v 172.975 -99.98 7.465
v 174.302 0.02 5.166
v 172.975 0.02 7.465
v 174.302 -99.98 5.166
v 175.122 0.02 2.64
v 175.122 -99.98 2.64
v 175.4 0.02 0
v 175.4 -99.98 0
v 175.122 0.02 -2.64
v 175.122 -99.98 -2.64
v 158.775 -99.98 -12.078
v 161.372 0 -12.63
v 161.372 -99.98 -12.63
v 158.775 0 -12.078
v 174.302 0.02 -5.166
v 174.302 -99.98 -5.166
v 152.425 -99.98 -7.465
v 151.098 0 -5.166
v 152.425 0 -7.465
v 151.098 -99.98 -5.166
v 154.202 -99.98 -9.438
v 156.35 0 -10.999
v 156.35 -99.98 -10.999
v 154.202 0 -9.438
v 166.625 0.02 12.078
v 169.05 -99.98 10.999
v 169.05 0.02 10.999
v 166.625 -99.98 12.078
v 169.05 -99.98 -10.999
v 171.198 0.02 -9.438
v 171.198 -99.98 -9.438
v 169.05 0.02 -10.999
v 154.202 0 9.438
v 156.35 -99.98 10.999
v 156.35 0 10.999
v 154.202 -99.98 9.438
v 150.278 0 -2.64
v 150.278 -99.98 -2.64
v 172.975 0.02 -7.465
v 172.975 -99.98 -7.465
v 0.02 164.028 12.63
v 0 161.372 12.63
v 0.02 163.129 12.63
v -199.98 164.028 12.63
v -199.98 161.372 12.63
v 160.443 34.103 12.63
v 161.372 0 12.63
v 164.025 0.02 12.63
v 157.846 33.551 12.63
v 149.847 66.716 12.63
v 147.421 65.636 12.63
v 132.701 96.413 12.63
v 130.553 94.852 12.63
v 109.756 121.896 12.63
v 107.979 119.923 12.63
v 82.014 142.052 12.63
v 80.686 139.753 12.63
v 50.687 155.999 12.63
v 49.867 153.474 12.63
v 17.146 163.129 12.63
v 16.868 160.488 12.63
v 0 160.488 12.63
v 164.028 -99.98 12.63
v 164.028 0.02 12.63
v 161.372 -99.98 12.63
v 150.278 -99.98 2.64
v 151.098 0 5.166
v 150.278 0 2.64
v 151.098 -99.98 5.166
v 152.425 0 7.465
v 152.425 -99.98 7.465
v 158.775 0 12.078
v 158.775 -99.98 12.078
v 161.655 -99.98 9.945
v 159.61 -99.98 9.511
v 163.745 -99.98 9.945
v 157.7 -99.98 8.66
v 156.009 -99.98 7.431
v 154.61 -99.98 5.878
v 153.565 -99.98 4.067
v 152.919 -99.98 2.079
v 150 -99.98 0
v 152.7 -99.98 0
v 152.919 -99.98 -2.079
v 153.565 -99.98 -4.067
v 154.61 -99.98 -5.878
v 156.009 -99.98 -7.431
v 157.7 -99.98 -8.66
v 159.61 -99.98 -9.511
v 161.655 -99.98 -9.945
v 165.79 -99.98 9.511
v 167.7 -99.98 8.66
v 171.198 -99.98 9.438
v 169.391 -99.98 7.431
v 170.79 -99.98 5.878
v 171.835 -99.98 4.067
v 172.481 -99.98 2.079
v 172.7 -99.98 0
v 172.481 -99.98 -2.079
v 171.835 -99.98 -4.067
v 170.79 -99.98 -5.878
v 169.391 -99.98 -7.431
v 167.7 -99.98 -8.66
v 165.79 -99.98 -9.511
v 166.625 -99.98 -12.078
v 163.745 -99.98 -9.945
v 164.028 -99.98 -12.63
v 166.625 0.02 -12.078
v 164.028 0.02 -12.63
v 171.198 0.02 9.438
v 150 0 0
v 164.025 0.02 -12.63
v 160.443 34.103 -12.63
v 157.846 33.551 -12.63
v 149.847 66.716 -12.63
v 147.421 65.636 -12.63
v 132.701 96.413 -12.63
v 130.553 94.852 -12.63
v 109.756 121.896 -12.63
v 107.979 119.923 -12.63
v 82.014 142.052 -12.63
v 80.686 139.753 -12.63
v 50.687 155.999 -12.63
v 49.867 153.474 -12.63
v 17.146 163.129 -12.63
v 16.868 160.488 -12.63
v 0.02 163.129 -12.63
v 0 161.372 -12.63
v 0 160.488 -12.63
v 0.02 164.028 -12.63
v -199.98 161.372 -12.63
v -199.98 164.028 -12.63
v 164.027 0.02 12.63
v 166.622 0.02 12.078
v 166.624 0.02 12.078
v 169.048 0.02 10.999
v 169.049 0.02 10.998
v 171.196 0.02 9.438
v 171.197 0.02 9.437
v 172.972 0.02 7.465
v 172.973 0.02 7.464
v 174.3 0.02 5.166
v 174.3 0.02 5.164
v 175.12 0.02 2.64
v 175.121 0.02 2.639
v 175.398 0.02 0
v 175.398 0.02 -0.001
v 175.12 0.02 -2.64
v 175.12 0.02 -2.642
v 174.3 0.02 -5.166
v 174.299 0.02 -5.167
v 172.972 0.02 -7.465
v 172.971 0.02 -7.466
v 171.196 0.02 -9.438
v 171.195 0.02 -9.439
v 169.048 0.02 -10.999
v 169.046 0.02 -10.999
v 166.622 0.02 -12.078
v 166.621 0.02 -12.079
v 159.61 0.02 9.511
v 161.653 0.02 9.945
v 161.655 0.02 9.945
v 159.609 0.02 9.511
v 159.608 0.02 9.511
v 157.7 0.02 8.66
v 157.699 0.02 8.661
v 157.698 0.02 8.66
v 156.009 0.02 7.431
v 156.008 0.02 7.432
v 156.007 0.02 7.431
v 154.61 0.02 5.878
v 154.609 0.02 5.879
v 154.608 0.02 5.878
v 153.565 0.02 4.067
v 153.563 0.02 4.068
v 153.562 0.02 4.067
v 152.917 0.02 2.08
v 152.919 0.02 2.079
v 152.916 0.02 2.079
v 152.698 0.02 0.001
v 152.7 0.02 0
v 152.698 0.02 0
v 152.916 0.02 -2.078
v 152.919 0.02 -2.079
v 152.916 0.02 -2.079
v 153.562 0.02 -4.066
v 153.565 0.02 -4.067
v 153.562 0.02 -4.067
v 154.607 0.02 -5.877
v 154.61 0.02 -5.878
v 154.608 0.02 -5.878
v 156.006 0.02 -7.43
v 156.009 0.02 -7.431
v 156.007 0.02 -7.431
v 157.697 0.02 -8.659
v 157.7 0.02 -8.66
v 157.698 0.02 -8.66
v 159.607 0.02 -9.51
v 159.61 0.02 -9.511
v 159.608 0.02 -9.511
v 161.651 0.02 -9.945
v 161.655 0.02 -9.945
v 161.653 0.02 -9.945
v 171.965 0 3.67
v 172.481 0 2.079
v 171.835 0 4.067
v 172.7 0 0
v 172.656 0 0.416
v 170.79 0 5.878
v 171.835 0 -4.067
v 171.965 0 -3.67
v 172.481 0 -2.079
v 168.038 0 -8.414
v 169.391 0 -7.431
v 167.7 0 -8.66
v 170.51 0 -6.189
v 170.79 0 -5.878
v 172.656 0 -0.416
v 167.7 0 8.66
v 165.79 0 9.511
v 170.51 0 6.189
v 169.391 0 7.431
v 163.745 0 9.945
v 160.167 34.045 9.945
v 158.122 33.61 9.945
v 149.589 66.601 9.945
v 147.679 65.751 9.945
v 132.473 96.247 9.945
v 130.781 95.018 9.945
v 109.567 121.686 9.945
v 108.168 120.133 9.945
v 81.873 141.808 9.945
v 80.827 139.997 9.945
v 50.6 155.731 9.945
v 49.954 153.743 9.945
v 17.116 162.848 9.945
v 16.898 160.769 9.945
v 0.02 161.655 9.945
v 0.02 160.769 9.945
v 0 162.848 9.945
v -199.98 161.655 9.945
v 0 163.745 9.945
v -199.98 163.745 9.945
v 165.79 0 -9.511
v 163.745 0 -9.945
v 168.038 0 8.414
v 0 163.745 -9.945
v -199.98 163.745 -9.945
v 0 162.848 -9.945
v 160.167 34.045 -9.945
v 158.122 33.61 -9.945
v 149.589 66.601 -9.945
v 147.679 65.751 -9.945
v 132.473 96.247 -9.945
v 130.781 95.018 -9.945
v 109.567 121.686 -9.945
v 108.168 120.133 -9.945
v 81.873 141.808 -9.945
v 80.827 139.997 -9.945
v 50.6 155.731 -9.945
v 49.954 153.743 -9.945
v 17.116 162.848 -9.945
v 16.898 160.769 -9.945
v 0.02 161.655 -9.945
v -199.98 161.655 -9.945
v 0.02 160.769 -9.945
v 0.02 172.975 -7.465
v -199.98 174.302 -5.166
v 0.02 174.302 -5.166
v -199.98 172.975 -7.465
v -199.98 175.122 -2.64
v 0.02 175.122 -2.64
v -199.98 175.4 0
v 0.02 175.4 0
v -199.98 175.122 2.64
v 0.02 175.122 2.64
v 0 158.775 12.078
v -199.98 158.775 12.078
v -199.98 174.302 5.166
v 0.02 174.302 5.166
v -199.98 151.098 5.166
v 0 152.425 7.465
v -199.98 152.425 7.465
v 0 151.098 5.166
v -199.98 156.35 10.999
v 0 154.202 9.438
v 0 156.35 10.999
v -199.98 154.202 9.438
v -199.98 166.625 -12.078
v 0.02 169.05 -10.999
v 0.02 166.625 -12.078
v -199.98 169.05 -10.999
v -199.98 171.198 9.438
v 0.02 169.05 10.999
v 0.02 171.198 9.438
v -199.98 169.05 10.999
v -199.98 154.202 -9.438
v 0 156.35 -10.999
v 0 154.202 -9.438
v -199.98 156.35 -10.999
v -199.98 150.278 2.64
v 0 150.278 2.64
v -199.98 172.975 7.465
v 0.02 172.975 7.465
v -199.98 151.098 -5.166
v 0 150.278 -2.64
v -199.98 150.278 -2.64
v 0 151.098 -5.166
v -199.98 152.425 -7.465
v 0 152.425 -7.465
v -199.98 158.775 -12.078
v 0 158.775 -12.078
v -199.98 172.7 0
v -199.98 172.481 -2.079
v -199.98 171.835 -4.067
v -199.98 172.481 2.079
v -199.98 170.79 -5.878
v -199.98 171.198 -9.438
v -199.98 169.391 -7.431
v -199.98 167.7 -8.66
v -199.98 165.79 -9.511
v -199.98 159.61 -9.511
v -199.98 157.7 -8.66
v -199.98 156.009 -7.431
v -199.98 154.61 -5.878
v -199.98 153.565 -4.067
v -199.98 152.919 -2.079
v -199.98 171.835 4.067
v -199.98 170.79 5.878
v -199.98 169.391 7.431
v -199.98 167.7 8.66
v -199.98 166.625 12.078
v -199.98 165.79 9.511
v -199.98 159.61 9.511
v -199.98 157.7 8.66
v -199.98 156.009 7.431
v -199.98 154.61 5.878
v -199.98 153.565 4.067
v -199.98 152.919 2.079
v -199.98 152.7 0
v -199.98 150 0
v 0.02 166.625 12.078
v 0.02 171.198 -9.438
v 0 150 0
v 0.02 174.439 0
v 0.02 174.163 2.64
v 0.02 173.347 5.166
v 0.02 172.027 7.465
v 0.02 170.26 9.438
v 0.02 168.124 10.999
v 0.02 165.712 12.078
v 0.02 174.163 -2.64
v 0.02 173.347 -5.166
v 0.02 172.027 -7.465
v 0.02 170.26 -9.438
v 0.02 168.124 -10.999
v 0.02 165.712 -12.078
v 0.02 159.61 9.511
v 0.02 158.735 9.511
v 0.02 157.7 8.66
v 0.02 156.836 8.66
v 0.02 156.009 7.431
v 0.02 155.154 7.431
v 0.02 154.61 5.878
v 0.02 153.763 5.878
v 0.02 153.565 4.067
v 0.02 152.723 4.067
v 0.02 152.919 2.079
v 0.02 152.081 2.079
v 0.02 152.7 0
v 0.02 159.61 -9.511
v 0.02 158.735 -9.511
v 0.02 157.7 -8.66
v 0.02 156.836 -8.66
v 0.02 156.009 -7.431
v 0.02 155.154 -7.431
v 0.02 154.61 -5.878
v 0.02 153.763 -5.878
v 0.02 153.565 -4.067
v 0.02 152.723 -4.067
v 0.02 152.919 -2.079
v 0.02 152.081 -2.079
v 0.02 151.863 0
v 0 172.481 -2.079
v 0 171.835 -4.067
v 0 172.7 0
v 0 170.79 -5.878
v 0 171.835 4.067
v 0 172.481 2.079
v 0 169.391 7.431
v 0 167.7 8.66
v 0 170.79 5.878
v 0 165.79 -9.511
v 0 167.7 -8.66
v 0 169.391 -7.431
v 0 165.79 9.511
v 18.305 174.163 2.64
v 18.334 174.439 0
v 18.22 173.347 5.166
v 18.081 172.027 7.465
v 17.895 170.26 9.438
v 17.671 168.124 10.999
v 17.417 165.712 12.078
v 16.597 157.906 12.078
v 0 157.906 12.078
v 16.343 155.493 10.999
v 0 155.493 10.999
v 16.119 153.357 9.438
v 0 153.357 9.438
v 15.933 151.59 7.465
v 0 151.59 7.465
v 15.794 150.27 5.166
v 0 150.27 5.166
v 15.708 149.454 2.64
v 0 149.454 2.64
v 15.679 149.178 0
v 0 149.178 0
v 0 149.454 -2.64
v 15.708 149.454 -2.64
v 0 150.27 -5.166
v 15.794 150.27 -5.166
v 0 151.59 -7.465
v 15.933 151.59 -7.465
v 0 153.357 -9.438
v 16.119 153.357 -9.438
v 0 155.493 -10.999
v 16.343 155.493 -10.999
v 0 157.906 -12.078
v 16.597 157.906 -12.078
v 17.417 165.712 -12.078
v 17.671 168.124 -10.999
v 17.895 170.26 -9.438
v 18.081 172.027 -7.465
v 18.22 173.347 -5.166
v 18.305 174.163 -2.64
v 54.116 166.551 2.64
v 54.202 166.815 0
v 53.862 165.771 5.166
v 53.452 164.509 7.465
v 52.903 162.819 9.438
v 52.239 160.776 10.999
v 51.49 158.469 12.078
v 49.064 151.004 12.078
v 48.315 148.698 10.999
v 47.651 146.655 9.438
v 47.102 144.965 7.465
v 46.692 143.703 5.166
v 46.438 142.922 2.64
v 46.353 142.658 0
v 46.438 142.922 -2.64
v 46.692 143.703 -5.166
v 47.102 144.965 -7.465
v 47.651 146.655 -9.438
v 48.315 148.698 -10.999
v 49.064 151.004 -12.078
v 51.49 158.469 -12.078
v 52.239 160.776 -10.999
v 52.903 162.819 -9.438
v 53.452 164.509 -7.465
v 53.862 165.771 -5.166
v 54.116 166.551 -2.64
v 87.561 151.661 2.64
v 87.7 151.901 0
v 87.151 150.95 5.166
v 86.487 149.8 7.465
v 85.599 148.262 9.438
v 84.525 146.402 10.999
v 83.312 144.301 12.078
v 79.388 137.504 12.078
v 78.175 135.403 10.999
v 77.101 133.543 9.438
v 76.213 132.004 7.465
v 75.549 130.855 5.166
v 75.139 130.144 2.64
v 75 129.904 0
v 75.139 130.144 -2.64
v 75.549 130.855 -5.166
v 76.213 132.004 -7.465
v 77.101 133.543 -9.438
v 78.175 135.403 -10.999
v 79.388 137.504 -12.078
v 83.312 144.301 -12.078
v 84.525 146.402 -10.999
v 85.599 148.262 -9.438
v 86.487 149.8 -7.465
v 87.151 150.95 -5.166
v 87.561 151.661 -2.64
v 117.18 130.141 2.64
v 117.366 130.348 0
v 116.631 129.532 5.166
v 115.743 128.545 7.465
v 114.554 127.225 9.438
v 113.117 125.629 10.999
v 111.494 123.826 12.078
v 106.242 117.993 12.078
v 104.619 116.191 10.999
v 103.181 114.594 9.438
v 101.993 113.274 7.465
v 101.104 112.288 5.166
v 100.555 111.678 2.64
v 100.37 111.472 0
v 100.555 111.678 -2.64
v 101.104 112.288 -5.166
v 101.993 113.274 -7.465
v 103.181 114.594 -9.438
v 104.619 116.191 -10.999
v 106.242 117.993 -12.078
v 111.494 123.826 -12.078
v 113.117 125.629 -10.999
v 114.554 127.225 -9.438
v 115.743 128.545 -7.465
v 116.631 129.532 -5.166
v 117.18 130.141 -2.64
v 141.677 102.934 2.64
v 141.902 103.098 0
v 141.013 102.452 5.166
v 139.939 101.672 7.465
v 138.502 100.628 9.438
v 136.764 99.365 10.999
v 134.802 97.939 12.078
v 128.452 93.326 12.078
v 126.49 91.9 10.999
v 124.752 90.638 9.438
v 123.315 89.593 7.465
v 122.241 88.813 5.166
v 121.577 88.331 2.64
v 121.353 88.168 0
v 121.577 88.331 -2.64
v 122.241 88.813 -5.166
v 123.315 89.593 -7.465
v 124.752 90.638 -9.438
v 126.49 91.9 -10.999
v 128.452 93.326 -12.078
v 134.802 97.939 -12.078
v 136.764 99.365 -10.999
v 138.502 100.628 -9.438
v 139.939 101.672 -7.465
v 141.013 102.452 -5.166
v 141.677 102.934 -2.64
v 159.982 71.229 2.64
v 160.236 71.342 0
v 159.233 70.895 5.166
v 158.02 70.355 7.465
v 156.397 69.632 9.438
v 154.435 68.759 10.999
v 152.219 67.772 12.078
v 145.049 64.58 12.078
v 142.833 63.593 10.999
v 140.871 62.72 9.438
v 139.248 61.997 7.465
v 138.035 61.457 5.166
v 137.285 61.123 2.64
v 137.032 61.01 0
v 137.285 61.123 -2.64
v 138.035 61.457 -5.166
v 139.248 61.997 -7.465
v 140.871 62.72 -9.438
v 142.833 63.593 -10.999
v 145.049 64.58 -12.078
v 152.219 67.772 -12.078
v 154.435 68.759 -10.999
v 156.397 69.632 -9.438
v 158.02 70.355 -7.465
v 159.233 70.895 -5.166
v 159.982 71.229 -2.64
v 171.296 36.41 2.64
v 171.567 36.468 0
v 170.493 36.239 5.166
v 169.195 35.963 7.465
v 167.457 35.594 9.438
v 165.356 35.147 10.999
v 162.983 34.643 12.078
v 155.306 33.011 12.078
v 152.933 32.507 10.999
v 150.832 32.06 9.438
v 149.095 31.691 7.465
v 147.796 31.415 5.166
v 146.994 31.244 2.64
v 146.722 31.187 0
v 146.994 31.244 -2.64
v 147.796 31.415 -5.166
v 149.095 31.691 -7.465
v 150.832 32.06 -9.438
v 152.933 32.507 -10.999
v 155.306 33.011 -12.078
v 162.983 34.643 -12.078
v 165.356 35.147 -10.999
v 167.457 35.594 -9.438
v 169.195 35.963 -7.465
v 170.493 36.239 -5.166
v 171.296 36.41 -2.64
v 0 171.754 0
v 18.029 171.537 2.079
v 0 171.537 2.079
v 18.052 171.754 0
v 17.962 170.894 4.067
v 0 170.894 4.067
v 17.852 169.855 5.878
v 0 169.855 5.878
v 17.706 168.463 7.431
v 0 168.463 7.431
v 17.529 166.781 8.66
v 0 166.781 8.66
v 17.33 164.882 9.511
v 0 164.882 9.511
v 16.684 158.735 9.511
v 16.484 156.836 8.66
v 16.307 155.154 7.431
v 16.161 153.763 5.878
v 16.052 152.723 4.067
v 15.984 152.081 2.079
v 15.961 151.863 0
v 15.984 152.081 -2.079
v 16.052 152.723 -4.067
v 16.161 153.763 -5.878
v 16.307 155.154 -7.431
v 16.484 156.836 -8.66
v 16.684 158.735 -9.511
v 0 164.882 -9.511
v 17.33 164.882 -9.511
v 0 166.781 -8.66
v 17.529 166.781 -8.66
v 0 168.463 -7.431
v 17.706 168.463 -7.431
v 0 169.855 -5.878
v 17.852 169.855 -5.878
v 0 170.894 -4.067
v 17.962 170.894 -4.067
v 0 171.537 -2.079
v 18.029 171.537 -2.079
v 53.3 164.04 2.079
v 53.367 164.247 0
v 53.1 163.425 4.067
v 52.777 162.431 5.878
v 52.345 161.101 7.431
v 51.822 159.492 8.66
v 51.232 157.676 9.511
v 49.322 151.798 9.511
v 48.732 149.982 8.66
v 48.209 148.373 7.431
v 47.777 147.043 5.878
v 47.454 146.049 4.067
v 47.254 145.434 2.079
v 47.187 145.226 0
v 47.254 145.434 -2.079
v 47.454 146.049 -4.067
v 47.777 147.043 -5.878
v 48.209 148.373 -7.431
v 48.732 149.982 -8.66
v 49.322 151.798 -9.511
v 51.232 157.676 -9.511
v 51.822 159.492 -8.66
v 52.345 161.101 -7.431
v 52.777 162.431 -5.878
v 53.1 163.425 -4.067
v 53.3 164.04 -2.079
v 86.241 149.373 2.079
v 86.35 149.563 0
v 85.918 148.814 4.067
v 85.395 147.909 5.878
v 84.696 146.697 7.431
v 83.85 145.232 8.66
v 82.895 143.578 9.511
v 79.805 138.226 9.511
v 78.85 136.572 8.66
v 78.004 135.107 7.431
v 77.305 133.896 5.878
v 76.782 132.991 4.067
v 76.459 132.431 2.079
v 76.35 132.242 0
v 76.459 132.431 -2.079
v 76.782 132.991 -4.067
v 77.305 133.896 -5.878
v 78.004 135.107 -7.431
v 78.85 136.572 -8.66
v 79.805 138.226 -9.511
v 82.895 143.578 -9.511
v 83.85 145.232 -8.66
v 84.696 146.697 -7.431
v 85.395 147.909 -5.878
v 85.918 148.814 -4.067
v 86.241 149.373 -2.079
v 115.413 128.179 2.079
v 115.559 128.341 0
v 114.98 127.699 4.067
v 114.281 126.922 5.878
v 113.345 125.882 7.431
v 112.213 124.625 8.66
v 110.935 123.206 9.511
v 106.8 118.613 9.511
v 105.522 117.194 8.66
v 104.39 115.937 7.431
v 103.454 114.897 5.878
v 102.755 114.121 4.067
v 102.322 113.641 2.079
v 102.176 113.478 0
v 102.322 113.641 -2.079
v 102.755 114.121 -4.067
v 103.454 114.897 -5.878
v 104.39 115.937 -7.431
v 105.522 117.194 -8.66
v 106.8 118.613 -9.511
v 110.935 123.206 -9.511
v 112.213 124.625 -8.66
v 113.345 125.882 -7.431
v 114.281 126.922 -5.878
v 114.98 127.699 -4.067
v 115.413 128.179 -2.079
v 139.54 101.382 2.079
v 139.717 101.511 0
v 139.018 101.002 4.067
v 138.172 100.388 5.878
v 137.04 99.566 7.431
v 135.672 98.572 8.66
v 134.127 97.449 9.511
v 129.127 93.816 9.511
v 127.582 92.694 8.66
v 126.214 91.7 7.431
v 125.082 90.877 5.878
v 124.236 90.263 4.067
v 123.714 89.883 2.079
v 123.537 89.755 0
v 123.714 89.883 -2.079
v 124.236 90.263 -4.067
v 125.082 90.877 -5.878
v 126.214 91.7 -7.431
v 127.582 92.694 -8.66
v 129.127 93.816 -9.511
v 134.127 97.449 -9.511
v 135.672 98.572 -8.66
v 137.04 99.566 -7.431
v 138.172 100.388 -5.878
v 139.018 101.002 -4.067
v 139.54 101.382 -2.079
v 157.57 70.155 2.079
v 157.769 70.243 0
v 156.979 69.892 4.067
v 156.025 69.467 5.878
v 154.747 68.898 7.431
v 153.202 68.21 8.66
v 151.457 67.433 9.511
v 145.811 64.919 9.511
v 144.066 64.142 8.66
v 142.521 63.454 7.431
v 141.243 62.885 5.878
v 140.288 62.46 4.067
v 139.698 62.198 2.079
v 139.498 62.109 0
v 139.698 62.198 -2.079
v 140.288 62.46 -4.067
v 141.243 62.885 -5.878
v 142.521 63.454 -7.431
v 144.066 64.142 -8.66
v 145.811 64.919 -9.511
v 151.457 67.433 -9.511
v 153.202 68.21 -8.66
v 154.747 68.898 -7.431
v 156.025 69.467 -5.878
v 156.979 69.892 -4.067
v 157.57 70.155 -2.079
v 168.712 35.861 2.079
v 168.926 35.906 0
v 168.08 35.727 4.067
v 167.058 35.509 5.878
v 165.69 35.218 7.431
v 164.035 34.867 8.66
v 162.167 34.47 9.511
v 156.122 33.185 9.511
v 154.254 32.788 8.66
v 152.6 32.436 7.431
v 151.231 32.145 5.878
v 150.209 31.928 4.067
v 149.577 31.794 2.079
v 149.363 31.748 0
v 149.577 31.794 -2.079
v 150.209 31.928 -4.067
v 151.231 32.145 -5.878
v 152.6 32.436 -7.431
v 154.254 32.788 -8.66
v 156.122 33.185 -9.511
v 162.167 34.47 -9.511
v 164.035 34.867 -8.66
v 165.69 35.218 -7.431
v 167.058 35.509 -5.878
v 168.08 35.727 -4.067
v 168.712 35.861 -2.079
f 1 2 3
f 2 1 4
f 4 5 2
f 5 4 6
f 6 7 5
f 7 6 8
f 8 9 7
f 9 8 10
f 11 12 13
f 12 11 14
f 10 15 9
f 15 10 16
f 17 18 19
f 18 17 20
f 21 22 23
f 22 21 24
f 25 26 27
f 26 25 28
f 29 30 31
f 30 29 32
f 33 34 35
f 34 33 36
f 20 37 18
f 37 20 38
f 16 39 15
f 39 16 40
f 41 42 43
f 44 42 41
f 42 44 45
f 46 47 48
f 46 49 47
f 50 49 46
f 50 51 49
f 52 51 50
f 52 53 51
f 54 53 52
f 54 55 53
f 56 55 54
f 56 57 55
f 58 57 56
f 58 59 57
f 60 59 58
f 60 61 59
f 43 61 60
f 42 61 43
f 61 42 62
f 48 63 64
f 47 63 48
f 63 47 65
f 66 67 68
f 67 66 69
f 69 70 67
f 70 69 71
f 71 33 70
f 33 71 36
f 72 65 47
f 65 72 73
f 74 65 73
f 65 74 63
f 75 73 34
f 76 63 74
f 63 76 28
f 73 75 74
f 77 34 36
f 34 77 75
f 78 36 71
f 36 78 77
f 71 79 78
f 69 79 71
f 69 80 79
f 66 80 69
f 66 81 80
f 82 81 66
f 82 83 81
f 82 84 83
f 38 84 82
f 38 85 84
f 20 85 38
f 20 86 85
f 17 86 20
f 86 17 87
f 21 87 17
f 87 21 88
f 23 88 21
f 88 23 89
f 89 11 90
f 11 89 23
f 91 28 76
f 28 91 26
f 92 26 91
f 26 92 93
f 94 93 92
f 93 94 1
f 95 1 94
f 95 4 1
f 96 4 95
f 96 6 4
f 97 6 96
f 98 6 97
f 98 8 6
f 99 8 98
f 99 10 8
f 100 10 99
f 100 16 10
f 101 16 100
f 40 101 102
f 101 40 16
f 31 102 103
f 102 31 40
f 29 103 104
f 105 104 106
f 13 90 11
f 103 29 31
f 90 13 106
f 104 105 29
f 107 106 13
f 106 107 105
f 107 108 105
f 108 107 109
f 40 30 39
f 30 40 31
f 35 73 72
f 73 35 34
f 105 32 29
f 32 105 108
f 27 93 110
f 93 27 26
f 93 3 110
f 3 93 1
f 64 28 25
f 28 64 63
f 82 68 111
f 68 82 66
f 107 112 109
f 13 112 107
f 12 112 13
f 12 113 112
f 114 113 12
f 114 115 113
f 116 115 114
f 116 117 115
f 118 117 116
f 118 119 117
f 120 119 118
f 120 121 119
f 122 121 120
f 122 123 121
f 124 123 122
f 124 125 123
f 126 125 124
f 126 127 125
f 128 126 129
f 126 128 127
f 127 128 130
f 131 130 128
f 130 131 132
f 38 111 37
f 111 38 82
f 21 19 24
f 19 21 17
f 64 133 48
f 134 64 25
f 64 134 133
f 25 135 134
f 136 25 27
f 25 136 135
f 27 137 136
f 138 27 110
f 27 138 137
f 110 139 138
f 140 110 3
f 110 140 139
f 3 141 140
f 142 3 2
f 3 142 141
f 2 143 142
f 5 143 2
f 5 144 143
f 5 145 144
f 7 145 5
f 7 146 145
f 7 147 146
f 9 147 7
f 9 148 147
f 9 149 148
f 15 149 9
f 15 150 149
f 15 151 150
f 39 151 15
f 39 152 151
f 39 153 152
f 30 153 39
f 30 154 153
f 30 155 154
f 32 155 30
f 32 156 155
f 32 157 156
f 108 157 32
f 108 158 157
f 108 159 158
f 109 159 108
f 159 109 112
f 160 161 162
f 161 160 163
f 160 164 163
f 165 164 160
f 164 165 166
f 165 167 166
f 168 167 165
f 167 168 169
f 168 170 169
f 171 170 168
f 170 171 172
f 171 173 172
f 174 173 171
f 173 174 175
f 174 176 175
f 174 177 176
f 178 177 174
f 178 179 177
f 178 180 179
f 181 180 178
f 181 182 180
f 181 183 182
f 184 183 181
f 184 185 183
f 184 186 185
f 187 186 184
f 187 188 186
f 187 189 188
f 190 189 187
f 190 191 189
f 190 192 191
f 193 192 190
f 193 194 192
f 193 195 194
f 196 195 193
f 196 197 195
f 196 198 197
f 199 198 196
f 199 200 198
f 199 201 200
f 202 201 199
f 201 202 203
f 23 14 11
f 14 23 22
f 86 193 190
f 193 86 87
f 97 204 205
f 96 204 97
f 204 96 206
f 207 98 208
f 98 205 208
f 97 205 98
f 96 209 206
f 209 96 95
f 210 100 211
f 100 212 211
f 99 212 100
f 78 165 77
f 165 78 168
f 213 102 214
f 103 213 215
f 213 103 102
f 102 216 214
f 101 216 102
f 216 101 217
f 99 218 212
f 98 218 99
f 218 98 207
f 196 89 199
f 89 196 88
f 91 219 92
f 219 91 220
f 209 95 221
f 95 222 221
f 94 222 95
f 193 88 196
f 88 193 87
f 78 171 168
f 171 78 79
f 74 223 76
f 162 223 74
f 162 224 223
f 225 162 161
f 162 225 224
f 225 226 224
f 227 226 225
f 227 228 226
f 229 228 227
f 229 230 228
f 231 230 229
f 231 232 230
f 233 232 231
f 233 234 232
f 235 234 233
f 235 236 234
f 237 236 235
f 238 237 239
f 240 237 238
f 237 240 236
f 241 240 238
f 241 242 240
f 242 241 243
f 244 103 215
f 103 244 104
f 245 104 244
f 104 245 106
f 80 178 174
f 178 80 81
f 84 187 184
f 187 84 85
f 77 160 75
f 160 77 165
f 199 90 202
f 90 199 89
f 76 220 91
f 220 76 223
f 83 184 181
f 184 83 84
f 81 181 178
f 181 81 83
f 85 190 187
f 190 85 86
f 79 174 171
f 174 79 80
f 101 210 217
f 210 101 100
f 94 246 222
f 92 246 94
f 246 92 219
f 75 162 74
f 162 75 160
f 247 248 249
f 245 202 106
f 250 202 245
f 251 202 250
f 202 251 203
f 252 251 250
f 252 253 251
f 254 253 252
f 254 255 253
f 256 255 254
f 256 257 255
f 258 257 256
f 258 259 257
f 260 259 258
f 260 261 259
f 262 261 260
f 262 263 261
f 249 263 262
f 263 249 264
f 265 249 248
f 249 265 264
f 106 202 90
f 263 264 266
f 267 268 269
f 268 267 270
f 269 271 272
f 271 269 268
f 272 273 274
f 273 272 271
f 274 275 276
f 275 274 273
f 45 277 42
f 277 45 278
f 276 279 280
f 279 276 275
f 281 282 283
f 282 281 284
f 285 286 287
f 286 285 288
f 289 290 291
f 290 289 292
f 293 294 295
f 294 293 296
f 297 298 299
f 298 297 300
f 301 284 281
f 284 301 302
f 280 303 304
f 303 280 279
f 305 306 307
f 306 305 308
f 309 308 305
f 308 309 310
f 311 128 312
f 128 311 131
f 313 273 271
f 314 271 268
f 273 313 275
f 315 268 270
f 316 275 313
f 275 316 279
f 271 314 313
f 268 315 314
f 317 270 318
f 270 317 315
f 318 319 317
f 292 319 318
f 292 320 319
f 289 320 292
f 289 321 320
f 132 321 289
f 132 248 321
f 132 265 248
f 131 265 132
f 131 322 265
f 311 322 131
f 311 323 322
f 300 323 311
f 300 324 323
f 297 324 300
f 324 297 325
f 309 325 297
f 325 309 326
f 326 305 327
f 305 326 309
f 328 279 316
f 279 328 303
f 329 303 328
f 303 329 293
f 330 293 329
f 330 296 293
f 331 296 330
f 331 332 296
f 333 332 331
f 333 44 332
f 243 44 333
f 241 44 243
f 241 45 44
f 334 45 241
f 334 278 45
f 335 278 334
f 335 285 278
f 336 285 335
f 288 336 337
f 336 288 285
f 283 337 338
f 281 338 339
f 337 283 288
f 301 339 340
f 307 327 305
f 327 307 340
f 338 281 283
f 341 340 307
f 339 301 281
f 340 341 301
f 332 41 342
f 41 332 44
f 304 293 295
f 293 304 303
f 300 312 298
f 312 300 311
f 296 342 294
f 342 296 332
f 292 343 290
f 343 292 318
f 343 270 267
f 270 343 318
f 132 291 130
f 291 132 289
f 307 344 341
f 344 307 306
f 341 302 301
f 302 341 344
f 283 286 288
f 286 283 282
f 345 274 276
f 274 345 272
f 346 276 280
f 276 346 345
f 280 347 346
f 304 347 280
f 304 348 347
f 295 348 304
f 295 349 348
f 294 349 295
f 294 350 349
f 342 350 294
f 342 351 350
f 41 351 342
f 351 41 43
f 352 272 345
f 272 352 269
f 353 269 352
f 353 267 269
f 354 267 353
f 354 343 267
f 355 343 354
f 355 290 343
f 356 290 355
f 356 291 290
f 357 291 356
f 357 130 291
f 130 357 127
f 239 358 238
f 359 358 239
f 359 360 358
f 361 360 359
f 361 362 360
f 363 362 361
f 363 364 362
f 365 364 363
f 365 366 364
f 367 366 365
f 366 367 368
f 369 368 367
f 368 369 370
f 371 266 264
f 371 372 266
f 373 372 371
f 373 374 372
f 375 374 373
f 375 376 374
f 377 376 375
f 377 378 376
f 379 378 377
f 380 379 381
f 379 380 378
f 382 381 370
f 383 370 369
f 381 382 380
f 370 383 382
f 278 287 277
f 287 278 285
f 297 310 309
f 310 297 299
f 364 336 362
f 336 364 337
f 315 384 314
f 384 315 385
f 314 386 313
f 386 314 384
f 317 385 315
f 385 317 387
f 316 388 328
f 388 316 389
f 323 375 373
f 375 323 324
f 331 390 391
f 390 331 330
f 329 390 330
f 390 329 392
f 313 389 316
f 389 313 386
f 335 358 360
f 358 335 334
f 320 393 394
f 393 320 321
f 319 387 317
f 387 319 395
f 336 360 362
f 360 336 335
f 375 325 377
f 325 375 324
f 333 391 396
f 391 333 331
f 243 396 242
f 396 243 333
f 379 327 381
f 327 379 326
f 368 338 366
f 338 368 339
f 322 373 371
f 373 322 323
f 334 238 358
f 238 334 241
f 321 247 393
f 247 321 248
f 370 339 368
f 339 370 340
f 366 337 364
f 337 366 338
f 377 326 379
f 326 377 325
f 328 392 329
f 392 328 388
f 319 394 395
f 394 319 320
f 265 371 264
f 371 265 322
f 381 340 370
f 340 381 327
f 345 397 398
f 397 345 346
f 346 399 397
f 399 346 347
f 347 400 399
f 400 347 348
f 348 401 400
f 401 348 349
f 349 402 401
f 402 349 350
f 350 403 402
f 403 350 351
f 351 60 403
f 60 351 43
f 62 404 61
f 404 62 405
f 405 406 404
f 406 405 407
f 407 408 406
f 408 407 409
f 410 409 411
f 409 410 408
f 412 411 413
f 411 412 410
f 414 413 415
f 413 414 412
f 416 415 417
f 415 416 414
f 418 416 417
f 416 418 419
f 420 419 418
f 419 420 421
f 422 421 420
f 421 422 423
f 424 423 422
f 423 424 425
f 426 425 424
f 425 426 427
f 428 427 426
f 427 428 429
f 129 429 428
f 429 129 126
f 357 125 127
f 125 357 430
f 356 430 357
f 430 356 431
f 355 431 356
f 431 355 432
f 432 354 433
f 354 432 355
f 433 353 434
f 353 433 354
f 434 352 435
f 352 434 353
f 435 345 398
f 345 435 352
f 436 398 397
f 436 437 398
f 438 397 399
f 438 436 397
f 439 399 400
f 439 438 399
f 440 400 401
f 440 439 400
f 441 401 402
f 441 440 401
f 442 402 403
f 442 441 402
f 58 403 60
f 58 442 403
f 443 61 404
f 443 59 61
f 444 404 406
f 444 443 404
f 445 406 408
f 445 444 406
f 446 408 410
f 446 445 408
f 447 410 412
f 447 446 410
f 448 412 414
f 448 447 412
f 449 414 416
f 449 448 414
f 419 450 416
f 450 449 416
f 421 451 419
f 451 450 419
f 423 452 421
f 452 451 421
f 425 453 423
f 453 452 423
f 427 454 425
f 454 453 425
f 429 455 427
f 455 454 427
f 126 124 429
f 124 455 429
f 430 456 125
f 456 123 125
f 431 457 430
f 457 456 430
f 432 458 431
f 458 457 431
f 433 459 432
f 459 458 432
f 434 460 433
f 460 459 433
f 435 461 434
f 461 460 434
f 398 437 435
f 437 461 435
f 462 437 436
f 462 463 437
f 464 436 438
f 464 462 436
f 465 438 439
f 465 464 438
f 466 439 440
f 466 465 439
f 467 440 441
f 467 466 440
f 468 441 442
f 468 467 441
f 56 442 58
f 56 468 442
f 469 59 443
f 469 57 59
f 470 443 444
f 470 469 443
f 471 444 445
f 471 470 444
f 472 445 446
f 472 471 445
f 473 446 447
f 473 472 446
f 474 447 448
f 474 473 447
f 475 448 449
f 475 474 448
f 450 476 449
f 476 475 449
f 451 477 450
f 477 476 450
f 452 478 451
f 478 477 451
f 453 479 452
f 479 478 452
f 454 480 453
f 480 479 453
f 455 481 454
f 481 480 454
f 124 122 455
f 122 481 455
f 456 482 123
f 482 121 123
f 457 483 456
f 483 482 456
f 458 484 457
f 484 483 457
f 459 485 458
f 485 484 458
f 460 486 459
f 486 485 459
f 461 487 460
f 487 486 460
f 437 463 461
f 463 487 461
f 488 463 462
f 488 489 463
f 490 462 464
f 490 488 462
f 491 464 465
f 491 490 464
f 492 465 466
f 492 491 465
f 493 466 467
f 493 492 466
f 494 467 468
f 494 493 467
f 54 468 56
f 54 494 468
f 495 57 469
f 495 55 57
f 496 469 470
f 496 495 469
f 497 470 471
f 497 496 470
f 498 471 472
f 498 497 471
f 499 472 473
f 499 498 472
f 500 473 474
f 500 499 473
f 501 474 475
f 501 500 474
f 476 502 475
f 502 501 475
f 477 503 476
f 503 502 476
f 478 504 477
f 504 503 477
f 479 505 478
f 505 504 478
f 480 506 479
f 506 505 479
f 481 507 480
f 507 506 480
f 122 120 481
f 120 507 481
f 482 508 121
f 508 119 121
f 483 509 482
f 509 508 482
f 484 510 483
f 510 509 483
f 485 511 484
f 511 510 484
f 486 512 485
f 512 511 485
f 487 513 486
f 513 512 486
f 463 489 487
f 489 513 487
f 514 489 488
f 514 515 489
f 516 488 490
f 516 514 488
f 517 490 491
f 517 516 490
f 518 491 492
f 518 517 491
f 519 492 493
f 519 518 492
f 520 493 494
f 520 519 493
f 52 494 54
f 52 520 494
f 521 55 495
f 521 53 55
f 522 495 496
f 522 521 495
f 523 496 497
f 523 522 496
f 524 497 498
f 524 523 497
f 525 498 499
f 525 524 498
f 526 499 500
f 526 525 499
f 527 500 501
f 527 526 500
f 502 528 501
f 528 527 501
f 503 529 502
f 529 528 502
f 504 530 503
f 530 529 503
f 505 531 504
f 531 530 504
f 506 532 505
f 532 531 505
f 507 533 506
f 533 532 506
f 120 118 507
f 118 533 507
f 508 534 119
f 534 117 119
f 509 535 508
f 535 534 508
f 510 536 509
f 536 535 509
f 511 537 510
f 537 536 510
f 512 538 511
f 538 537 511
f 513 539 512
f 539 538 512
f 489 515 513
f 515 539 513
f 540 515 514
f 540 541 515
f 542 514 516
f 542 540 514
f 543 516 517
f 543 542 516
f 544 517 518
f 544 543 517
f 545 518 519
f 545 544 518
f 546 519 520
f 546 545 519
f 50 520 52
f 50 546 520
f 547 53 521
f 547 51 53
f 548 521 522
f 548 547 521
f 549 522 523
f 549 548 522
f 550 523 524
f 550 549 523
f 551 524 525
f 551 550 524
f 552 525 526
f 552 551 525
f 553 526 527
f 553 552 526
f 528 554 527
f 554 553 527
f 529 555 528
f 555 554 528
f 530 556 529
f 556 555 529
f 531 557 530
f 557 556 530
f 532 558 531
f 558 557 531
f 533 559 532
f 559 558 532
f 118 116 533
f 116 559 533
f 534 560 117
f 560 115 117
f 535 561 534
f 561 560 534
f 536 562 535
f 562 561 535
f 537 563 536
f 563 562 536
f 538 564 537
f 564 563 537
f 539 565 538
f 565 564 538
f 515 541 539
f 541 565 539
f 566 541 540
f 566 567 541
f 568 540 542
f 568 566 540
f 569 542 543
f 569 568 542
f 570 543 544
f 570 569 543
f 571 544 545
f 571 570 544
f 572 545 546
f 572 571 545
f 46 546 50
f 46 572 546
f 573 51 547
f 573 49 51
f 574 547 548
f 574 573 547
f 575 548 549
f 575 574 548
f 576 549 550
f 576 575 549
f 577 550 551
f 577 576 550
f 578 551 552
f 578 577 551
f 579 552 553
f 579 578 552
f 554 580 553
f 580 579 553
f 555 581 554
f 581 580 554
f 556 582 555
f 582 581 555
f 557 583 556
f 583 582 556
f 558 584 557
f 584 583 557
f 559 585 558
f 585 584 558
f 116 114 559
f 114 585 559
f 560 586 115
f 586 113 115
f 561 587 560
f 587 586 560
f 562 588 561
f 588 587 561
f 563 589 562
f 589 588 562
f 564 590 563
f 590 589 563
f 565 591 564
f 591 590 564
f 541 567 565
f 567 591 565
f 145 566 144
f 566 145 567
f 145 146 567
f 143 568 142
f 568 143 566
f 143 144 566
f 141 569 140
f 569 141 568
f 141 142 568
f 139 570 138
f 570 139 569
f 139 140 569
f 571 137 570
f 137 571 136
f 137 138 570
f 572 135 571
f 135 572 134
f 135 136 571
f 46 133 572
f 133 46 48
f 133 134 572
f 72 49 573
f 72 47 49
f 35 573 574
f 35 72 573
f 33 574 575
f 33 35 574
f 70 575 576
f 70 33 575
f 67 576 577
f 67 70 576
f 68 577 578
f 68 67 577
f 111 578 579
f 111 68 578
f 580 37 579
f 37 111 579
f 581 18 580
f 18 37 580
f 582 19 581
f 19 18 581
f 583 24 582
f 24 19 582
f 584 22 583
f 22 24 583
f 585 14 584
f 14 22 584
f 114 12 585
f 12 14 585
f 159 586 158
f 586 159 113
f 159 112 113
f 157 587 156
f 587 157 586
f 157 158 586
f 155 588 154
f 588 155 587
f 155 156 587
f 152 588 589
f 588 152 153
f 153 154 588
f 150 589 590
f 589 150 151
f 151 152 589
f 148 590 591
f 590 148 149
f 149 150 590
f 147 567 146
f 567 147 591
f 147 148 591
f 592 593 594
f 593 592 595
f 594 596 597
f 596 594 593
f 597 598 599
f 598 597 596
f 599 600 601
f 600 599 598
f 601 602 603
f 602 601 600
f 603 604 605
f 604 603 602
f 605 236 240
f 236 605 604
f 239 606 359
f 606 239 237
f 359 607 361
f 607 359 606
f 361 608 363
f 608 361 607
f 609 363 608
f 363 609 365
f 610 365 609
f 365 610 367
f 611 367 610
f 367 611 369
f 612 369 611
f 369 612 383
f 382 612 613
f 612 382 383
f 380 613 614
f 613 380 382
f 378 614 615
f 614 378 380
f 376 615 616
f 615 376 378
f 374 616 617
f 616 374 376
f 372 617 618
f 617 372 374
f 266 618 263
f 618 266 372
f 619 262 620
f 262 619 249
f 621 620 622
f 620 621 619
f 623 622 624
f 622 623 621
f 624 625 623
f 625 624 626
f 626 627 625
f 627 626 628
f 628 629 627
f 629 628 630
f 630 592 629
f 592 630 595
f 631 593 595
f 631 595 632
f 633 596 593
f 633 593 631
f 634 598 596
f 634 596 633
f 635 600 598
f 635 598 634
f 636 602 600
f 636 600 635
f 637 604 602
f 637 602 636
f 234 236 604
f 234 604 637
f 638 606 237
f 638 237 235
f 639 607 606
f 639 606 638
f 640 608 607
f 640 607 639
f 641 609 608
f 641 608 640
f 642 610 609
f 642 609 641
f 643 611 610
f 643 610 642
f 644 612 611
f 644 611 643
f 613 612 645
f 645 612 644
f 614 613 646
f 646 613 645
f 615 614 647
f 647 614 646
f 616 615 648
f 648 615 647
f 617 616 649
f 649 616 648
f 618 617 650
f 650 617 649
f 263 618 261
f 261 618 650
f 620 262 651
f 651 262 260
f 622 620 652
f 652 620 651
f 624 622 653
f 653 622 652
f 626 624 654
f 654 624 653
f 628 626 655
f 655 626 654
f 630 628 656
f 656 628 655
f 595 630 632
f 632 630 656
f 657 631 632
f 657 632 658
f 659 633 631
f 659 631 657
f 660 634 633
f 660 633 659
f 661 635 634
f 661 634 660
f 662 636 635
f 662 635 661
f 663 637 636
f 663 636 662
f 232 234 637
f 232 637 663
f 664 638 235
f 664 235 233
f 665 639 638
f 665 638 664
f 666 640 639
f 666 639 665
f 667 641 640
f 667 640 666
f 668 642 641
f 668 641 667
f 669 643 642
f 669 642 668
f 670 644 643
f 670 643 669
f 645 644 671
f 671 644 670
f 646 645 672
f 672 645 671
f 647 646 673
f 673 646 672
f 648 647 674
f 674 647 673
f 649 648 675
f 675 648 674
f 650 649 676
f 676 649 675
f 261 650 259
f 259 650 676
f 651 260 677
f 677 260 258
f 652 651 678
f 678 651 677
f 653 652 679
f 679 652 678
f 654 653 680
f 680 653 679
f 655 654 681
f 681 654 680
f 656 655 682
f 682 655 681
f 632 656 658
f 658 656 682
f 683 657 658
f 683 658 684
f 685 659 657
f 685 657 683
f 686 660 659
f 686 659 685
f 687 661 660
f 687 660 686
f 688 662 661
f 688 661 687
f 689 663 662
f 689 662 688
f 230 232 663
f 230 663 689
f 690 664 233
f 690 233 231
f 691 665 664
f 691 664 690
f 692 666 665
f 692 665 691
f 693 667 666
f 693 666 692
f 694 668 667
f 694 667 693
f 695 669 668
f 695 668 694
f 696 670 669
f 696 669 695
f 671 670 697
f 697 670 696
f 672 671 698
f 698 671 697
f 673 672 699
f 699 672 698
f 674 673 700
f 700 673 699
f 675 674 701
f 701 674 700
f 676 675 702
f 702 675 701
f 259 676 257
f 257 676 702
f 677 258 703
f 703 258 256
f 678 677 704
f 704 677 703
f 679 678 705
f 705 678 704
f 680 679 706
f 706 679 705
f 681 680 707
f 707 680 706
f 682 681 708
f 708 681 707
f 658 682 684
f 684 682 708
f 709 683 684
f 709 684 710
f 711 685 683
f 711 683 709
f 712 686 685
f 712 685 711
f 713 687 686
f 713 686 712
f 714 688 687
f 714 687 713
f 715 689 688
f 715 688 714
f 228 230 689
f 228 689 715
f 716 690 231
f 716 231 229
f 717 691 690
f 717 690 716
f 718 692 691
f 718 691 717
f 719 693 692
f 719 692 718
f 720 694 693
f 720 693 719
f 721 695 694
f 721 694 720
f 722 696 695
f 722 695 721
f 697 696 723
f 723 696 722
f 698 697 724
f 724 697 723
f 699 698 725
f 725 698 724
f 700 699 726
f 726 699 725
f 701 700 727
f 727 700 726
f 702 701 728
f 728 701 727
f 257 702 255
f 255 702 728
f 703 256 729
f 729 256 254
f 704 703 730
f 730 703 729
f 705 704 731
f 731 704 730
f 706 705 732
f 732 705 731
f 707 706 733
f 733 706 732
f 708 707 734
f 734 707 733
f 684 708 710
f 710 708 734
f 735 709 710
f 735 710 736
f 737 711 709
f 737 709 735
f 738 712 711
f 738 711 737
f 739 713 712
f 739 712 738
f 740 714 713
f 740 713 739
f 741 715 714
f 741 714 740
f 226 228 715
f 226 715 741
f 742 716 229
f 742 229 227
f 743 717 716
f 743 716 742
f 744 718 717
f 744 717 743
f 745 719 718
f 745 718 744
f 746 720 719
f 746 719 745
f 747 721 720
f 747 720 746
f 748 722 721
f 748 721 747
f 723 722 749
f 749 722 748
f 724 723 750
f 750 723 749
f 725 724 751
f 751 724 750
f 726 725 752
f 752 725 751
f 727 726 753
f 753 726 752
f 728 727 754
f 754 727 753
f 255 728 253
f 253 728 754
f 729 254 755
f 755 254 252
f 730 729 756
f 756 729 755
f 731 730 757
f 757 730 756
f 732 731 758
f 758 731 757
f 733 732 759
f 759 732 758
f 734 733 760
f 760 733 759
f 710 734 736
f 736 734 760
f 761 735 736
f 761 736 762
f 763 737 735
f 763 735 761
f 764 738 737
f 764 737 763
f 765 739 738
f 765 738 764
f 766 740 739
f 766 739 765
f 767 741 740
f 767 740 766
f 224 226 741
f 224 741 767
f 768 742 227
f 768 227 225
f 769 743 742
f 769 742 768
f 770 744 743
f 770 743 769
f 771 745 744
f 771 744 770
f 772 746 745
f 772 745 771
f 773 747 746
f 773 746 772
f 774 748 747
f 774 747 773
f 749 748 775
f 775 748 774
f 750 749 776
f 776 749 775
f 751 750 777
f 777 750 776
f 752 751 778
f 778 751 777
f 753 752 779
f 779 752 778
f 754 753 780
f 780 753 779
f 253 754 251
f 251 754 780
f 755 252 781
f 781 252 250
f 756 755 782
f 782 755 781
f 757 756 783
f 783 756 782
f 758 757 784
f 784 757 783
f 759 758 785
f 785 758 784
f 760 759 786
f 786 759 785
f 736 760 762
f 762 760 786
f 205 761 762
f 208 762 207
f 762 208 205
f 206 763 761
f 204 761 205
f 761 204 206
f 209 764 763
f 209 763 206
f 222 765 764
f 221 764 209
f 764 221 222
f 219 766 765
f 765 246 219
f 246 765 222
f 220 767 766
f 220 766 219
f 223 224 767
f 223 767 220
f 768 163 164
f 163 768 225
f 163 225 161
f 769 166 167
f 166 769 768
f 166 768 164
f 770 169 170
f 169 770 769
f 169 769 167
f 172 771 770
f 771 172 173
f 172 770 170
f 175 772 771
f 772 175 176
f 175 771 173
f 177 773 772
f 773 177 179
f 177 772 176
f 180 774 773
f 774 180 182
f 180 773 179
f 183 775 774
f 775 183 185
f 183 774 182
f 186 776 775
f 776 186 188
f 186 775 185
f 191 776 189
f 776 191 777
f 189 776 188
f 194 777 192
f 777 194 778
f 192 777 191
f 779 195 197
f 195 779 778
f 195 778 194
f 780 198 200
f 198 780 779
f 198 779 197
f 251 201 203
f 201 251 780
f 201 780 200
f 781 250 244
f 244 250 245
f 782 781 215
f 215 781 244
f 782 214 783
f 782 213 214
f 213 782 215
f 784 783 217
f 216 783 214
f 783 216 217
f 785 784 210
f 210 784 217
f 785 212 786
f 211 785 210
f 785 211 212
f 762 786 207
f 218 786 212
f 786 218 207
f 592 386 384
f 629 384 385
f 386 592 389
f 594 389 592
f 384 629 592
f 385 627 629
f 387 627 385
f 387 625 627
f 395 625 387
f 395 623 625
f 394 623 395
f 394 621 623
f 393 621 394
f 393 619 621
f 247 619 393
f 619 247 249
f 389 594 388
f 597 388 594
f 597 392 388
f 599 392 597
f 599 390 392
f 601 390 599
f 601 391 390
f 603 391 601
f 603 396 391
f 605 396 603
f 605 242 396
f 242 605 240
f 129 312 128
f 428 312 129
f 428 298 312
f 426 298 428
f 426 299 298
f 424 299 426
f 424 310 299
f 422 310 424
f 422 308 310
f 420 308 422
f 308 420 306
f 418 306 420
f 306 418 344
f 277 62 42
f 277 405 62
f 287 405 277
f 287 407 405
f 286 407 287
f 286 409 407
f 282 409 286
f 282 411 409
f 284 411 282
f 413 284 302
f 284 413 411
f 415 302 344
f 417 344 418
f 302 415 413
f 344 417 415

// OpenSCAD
//example
pipeBend(od=25.4, t=2.7, radius=150, startAngle=00, endAngle=90, startLength=100, endLength=200);

 module pipeBend(od, t, radius, startAngle=0, endAngle=180, startLength=0, endLength=0) {
    union() {
        // lower arm
        if (startLength>0) {
            rotate([0, 0, startAngle]) translate([radius + od/2, 0.02, 0])
            rotate([90, 0, 0]) difference() {
                cylinder(r=od/2, h=startLength);
            translate([0, 0, -1]) cylinder(r=(od/2-t), h=startLength+2);
            }
        }
        // upper arm
        if (endLength>0) {
            rotate([0, 0, endAngle]) translate([radius + od/2, -0.02, 0])
            rotate([-90, 0, 0]) 
            difference() {
                cylinder(r=od/2, h=endLength);
                translate([0, 0, -1]) cylinder(r=(od/2-t), h=endLength+2);
            }
        }
        // bend
        difference() {
            // torus
            rotate_extrude() translate([radius + od/2, 0, 0]) circle(r=od/2);

            // torus cutout
            rotate_extrude() translate([radius + od/2, 0, 0])circle(r=(od/2-t));
            // lower cutout
            rotate([0, 0, startAngle]) translate([-(radius+2*od/2+1) * (((endAngle - startAngle) <= 180)?1:0), -radius-2*od/2-2, -(od/2+1)]) cube([2*(radius+2*od/2+1), radius+2*od/2+2, 2*(od/2+1)]);
            // upper cutout
            rotate([0, 0, endAngle]) translate([-(radius+2*od/2+1) * (((endAngle - startAngle) <= 180)?1:0), 0, -od/2]) cube([2*(radius+2*od/2+1), radius+2*od/2+1, 2*(od/2+1)]);
        }
    }
}
